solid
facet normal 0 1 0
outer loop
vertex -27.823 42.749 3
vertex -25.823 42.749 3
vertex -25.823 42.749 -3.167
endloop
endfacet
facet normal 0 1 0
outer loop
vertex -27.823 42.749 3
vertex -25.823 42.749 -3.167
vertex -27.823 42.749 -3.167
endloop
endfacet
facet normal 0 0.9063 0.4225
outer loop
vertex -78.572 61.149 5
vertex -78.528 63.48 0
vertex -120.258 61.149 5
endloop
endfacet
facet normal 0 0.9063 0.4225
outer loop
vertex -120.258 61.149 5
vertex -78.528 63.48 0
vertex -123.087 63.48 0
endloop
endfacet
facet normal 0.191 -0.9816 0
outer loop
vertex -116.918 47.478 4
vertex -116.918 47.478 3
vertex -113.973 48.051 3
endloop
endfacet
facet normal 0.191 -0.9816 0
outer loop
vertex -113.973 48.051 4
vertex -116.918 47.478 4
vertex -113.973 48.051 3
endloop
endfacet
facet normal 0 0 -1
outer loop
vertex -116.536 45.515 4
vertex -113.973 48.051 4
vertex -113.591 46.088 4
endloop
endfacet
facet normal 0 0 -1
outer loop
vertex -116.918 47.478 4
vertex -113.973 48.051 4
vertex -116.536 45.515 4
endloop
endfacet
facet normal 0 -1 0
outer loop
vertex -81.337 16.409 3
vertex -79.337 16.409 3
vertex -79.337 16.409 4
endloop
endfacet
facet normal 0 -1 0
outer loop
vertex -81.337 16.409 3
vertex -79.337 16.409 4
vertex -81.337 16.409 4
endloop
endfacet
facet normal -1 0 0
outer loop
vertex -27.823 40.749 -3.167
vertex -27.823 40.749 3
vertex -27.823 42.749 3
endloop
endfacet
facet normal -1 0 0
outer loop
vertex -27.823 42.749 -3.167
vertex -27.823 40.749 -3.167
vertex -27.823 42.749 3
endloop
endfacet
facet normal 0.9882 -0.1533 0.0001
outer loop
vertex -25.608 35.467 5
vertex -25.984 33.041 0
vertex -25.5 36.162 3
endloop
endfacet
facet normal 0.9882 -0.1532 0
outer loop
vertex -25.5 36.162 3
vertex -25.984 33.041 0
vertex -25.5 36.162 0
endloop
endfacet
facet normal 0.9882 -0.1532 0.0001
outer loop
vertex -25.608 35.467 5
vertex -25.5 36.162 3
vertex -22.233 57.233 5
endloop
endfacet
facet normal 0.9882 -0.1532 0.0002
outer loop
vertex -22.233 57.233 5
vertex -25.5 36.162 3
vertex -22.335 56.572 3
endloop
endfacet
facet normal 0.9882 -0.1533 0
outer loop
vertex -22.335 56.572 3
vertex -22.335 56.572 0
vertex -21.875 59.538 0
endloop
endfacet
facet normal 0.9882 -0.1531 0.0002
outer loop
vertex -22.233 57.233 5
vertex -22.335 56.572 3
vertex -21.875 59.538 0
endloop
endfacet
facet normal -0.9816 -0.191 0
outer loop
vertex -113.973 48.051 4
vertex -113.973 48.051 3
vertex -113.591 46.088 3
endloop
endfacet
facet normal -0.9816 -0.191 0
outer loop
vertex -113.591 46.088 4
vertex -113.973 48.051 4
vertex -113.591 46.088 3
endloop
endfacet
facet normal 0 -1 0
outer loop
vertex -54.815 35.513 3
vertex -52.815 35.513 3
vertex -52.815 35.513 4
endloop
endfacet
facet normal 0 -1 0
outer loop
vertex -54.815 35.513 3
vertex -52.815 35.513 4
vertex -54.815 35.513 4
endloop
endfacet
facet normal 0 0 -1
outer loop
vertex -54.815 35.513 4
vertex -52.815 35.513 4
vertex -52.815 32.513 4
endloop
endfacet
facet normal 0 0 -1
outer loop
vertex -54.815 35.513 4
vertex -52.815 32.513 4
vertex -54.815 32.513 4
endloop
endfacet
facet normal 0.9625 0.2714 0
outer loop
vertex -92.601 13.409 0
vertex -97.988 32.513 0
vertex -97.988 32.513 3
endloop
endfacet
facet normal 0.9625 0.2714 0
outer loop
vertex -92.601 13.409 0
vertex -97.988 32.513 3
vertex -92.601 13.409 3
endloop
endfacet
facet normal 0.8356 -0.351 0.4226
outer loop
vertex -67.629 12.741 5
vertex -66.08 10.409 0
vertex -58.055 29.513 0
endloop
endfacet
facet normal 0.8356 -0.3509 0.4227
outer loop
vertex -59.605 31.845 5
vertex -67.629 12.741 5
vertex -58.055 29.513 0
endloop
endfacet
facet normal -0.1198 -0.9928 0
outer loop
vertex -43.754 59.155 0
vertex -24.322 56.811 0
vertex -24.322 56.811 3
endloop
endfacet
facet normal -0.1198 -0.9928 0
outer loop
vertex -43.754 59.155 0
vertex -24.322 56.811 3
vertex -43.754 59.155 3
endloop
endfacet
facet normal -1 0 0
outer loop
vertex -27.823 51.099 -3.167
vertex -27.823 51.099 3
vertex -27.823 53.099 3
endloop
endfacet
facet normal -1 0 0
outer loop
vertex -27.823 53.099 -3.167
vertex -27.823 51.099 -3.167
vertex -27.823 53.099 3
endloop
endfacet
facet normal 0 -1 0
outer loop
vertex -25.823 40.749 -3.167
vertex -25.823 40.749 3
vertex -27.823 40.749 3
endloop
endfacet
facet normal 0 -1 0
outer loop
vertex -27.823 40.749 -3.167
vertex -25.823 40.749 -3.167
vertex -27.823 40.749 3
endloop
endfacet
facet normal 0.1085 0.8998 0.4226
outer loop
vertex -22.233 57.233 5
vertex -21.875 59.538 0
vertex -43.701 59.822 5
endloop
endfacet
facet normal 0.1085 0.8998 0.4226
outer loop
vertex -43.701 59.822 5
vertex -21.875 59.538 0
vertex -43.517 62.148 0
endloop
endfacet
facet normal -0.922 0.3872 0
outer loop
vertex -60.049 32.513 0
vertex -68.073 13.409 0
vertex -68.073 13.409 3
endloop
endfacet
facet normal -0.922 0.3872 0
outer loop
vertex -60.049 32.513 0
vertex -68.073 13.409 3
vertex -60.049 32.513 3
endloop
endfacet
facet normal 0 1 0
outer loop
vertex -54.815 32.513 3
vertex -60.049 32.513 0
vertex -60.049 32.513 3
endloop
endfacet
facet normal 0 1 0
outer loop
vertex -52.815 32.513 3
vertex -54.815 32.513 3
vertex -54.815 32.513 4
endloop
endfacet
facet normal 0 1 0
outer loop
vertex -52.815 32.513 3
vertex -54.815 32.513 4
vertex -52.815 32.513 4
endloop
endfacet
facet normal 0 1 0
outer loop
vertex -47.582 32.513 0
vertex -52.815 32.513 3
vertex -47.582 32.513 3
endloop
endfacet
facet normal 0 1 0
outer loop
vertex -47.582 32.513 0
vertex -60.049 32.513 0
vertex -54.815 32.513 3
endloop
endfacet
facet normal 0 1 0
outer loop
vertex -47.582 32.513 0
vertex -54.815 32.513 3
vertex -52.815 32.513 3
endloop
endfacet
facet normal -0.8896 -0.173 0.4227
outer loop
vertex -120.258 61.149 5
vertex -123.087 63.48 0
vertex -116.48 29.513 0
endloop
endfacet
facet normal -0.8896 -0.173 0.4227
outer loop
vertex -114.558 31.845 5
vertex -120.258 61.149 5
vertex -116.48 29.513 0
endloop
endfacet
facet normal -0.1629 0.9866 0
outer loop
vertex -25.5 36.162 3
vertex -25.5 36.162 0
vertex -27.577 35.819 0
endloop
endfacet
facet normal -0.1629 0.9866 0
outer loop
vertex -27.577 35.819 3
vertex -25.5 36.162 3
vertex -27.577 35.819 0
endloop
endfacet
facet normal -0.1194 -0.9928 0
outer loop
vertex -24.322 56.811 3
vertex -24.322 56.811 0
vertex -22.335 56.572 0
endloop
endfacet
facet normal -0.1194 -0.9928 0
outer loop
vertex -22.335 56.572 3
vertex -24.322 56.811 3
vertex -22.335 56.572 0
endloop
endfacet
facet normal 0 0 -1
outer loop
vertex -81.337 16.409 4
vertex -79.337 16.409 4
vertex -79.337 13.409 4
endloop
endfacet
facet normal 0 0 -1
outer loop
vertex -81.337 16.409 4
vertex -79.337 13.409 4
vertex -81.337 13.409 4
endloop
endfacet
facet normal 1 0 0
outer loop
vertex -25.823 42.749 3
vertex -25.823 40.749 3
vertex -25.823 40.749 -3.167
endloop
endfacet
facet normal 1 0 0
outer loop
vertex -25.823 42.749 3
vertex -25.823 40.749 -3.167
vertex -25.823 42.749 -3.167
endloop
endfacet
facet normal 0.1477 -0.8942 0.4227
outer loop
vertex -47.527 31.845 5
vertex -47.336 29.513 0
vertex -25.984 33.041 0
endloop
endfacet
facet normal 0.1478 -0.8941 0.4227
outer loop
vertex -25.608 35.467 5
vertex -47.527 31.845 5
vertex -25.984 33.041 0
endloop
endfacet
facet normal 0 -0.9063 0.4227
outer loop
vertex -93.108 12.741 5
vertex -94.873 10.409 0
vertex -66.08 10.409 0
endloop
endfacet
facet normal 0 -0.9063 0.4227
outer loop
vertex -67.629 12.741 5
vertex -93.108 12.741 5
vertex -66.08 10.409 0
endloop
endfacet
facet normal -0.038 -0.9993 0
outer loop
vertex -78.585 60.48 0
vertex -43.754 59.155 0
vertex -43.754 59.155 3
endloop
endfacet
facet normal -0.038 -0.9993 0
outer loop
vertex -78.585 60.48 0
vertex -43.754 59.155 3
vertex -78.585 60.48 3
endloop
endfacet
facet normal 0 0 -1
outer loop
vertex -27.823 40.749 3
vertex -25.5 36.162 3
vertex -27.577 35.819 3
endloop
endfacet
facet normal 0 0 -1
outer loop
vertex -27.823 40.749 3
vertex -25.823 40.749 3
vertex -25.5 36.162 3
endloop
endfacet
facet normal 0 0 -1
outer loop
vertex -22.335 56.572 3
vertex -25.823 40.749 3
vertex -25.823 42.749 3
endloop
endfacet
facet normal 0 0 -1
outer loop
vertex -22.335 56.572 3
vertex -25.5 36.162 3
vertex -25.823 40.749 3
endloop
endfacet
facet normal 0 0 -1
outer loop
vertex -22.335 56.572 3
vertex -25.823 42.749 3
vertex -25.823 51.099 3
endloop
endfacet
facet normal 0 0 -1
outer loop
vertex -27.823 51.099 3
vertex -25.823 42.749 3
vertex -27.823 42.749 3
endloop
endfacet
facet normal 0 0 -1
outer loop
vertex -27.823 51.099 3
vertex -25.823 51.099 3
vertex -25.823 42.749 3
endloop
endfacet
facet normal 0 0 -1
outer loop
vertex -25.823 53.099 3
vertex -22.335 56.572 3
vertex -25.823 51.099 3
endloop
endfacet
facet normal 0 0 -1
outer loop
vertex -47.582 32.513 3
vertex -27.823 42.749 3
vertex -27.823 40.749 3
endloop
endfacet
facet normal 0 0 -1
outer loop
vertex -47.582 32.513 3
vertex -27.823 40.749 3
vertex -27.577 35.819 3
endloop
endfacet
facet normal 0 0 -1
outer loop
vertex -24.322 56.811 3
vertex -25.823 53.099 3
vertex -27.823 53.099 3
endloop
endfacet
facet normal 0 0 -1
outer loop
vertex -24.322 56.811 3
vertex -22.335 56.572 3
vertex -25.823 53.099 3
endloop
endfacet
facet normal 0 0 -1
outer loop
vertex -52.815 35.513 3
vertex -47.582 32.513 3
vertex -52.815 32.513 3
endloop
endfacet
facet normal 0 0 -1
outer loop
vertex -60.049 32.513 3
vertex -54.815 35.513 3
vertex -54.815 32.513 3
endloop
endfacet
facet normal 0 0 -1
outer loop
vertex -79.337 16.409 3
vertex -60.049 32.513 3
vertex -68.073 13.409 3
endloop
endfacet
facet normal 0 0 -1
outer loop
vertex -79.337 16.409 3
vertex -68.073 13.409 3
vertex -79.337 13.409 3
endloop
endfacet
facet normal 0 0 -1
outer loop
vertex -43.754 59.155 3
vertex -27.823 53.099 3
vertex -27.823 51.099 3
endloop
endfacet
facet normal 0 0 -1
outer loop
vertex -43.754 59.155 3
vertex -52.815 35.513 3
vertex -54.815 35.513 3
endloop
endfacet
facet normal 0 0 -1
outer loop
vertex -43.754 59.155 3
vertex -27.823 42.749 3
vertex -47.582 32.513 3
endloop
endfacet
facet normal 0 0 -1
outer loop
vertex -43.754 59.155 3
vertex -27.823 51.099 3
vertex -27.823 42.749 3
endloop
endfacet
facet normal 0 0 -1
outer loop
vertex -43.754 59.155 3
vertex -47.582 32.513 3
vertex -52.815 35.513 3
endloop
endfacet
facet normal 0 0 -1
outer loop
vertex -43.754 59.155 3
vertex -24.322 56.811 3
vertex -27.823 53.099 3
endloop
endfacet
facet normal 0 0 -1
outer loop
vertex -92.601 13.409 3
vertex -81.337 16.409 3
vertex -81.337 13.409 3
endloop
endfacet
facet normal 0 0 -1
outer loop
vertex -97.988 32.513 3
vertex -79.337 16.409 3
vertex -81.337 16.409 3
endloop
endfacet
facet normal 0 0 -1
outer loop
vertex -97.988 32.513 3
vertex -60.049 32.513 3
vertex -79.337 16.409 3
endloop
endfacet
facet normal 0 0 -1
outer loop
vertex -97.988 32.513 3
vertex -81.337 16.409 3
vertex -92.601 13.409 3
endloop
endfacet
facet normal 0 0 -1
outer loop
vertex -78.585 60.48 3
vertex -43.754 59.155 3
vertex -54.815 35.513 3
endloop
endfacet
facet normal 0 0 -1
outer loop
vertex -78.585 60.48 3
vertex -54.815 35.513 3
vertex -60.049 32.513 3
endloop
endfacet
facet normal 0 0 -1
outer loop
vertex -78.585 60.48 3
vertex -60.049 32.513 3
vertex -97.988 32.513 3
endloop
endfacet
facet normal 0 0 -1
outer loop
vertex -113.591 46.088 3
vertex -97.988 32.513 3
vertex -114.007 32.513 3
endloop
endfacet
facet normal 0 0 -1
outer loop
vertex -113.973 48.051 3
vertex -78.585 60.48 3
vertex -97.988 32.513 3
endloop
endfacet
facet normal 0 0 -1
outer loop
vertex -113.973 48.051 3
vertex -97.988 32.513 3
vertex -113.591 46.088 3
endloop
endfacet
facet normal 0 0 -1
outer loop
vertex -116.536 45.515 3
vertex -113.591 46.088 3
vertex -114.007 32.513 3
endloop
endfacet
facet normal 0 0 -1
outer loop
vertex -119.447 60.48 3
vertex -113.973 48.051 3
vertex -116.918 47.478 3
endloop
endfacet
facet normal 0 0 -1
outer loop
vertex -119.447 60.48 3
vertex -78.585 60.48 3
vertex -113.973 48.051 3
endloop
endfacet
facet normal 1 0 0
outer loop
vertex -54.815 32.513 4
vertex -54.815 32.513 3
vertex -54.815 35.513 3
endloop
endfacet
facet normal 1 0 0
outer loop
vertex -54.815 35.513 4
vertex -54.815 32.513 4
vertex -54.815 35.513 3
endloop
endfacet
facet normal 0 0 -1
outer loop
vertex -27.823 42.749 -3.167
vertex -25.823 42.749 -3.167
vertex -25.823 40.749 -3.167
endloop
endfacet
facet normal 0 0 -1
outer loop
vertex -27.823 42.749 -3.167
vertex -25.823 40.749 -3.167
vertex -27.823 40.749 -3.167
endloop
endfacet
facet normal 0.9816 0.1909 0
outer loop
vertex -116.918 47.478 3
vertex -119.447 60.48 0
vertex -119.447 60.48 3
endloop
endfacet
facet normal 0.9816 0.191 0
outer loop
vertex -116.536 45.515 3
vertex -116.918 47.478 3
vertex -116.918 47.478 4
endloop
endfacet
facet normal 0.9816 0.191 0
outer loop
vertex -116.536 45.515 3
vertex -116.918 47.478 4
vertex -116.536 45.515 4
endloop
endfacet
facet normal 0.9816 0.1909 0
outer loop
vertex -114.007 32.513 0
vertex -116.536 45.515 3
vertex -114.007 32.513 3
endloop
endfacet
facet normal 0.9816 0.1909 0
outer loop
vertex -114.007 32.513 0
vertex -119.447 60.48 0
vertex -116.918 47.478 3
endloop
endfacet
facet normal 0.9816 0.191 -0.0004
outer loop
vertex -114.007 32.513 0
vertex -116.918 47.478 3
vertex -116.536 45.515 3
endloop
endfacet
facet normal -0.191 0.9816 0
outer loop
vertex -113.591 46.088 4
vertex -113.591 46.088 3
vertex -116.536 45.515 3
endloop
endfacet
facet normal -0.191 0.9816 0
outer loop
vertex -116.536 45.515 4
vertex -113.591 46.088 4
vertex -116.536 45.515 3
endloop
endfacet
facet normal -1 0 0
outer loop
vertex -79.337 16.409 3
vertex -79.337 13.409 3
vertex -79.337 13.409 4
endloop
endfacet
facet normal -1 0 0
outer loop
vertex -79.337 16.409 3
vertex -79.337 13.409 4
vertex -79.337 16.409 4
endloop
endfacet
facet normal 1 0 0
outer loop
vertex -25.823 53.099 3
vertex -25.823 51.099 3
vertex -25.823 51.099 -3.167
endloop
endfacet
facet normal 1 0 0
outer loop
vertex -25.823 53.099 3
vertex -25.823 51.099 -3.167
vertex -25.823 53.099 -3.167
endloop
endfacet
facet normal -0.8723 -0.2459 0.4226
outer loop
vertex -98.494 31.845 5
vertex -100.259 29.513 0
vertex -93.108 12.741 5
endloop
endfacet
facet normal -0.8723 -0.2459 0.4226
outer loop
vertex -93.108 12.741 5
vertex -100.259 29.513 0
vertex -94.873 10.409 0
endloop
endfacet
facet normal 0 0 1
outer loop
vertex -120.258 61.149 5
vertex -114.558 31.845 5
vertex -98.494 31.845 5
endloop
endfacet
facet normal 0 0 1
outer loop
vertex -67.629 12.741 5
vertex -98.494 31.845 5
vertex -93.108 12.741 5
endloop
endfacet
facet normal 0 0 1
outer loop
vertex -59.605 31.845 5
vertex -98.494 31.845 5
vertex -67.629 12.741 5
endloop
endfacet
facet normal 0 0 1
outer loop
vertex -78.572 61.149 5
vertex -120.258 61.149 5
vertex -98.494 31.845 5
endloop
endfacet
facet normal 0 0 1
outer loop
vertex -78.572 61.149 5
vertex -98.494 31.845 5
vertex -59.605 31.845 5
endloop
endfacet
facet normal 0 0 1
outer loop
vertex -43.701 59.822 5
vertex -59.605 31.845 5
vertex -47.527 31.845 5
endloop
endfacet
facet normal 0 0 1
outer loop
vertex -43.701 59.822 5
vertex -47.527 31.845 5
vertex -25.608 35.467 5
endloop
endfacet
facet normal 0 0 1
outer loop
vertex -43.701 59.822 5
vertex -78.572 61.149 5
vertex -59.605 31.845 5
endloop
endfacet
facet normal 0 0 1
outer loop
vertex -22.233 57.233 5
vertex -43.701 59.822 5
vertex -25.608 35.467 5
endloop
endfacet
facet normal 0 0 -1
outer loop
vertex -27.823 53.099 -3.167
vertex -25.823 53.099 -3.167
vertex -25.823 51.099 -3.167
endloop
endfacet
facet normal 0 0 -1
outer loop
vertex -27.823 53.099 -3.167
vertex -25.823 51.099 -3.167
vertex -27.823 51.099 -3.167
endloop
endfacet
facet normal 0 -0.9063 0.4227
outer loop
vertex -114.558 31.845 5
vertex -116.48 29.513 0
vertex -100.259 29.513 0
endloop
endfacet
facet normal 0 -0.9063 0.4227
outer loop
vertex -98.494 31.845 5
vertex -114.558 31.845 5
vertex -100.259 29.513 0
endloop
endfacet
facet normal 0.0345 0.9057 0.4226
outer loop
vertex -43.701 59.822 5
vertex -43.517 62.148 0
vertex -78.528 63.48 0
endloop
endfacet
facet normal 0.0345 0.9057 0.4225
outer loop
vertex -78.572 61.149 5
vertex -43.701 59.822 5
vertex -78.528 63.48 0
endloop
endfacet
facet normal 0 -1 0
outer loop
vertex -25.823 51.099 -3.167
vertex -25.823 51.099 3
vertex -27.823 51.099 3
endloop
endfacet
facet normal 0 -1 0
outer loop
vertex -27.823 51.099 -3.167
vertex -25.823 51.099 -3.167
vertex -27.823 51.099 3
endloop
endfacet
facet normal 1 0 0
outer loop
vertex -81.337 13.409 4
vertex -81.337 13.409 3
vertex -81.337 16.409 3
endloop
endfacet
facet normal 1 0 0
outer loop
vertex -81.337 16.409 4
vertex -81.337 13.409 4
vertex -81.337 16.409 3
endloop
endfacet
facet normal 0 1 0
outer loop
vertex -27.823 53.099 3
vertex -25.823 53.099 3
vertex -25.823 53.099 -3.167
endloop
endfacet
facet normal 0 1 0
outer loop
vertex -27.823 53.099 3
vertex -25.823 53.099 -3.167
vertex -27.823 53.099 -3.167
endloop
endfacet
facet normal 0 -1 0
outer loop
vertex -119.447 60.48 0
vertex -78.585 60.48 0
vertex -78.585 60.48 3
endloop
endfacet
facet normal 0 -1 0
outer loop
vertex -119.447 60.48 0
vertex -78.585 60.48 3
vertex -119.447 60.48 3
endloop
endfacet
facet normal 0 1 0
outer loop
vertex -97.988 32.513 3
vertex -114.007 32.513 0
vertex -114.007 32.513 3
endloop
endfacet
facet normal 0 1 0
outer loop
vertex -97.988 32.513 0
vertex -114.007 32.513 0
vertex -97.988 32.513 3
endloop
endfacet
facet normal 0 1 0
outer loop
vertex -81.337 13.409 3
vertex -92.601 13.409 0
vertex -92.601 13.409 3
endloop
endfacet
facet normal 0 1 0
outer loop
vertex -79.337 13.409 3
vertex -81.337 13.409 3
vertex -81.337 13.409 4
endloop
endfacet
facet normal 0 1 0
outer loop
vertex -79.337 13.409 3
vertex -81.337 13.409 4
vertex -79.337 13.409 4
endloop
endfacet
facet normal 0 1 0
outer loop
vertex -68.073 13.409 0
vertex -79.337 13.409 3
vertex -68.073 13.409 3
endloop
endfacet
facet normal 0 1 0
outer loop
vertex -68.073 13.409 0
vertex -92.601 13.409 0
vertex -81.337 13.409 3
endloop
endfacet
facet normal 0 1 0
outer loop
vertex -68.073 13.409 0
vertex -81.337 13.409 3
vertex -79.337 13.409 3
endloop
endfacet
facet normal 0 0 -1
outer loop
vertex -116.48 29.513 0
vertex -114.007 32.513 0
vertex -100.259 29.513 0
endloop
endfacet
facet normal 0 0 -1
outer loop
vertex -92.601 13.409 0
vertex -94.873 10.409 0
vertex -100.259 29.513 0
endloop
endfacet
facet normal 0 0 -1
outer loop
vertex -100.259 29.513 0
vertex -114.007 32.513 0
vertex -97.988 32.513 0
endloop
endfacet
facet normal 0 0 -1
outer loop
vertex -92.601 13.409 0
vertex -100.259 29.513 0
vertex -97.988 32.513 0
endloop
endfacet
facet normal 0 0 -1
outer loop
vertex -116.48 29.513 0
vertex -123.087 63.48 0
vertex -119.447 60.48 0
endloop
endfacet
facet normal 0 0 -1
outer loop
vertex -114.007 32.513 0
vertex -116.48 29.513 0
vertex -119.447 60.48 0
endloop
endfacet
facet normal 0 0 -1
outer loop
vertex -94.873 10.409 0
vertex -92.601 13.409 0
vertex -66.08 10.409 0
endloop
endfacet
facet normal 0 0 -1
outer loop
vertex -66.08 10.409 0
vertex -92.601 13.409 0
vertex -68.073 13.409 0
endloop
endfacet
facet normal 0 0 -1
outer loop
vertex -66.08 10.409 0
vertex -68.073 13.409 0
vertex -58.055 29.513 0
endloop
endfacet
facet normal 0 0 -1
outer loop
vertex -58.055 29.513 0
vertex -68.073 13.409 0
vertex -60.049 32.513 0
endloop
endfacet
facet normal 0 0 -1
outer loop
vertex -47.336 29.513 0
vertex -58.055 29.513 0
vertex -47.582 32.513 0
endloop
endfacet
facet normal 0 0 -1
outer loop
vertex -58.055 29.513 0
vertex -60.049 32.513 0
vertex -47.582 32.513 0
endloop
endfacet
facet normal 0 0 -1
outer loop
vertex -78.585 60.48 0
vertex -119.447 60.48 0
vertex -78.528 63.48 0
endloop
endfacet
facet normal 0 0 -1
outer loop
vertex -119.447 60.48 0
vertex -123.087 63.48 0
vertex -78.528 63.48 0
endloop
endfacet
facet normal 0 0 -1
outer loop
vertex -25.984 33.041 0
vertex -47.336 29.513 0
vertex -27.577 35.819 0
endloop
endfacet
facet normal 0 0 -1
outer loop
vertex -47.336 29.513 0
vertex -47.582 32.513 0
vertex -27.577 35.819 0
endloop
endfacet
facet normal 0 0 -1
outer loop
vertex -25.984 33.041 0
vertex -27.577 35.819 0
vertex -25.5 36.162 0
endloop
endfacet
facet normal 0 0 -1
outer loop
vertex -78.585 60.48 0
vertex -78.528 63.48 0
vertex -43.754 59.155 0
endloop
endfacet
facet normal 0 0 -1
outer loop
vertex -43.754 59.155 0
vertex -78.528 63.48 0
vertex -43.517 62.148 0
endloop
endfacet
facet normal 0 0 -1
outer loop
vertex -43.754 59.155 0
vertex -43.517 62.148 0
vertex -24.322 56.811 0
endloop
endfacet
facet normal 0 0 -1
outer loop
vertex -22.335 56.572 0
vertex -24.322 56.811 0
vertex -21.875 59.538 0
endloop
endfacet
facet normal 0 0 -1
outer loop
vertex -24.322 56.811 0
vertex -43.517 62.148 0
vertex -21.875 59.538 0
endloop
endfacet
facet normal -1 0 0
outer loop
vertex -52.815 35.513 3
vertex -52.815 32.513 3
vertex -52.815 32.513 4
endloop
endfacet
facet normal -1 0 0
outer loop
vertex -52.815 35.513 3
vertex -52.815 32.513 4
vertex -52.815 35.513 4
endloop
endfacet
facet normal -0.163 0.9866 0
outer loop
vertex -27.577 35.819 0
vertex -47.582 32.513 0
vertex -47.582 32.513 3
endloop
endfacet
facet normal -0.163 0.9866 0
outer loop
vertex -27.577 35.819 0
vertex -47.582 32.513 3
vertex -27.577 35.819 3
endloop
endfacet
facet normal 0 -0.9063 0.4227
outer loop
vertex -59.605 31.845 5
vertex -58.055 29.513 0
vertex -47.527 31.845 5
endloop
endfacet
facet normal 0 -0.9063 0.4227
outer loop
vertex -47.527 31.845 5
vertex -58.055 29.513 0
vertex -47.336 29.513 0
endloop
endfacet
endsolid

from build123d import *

# Parameters (mm, degrees)
BOSS_EXTRUDE1_DEPTH = 5
SHELL1_DEPTH        = 3
DRAFT1_ANGLE        = -25
CUT_EXTRUDE4_DEPTH  = 3
SKETCH7_W           = 2
SKETCH7_H           = 2
BOSS_EXTRUDE3_DEPTH = 6.167458
SKETCH9_W           = 2
SKETCH9_H           = 3
CUT_EXTRUDE5_DEPTH  = 1


# Read off the part's stored shape, not the designer's step: Shell1
with BuildPart() as part:
    # Sketch1 → Boss-Extrude1 (new body)
    with BuildSketch(Plane.XY):
        Polygon((-25.983626021, 33.041313611), (-21.875122617, 59.537949952), (-43.516730546, 62.148416278), (-78.528153024, 63.480237824), (-123.086733491, 63.480237824), (-116.479692334, 29.513255832), (-100.259099485, 29.513255832), (-94.872589048, 10.409344773), (-66.079679944, 10.409344773), (-58.05527459, 29.513255832), (-47.335578993, 29.513255832), align=None)
    extrude(amount=BOSS_EXTRUDE1_DEPTH)

    # Shell1 outline → Shell1 (cut)
    with BuildSketch(Plane.XY):
        Polygon((-47.581760232, 32.513255832), (-27.576866011, 35.818734388), (-24.321805769, 56.811329265), (-43.753778982, 59.155263778), (-78.585191842, 60.480237824), (-119.446966155, 60.480237824), (-114.007006811, 32.513255832), (-97.988004481, 32.513255832), (-92.601494043, 13.409344773), (-68.0734658, 13.409344773), (-60.049060446, 32.513255832), align=None)
    extrude(amount=SHELL1_DEPTH, mode=Mode.SUBTRACT)

    # Draft1
    draft1_faces = [part.faces().sort_by_distance(p)[0] for p in [
        (-52.695426792, 29.513255832, 2.5),
        (-36.659602507, 31.277284722, 2.5),
        (-62.067477267, 19.961300303, 2.5),
        (-80.476134496, 10.409344773, 2.5),
        (-97.565844267, 19.961300303, 2.5),
        (-108.36939591, 29.513255832, 2.5),
        (-119.783212913, 46.496746828, 2.5),
        (-32.695926582, 60.843183115, 2.5),
        (-61.022441785, 62.814327051, 2.5),
        (-100.807443258, 63.480237824, 2.5),
    ]]
    draft(draft1_faces, Plane(origin=(0, 0, 0), x_dir=(-1, 0, 0), z_dir=(0, 0, -1)), DRAFT1_ANGLE)

    # Sketch6 → Cut-Extrude4 (cut)
    with BuildSketch(Plane(origin=(0, 0, 0), x_dir=(-1, 0, 0), z_dir=(0, 0, -1))):
        Polygon((24.321805769, 56.811329265), (22.335064622, 56.571683446), (25.499748774, 36.161943725), (27.576866011, 35.818734388), align=None)
    extrude(amount=-CUT_EXTRUDE4_DEPTH, mode=Mode.SUBTRACT)

    # Sketch7 → Boss-Extrude3 (add)
    with BuildSketch(Plane(origin=(0, 0, 3), x_dir=(-1, 0, 0), z_dir=(0, 0, -1))):
        with Locations((26.823354353, 52.098786124)):
            Rectangle(SKETCH7_W, SKETCH7_H)
        with Locations((26.823354353, 41.748786124)):
            Rectangle(SKETCH7_W, SKETCH7_H)
    extrude(amount=BOSS_EXTRUDE3_DEPTH)

    # Sketch9 → Cut-Extrude5 (cut)
    with BuildSketch(Plane(origin=(0, 0, 3), x_dir=(-1, 0, 0), z_dir=(0, 0, -1))):
        with Locations((80.337479922, 14.909344773)):
            Rectangle(SKETCH9_W, SKETCH9_H)
        with Locations((53.815410339, 34.013255832)):
            Rectangle(SKETCH9_W, SKETCH9_H)
        Polygon((116.917921585, 47.47834949), (113.973113599, 48.051154798), (113.591243393, 46.087949474), (116.53605138, 45.515144166), align=None)
    extrude(amount=-CUT_EXTRUDE5_DEPTH, mode=Mode.SUBTRACT)


solid = part.part
